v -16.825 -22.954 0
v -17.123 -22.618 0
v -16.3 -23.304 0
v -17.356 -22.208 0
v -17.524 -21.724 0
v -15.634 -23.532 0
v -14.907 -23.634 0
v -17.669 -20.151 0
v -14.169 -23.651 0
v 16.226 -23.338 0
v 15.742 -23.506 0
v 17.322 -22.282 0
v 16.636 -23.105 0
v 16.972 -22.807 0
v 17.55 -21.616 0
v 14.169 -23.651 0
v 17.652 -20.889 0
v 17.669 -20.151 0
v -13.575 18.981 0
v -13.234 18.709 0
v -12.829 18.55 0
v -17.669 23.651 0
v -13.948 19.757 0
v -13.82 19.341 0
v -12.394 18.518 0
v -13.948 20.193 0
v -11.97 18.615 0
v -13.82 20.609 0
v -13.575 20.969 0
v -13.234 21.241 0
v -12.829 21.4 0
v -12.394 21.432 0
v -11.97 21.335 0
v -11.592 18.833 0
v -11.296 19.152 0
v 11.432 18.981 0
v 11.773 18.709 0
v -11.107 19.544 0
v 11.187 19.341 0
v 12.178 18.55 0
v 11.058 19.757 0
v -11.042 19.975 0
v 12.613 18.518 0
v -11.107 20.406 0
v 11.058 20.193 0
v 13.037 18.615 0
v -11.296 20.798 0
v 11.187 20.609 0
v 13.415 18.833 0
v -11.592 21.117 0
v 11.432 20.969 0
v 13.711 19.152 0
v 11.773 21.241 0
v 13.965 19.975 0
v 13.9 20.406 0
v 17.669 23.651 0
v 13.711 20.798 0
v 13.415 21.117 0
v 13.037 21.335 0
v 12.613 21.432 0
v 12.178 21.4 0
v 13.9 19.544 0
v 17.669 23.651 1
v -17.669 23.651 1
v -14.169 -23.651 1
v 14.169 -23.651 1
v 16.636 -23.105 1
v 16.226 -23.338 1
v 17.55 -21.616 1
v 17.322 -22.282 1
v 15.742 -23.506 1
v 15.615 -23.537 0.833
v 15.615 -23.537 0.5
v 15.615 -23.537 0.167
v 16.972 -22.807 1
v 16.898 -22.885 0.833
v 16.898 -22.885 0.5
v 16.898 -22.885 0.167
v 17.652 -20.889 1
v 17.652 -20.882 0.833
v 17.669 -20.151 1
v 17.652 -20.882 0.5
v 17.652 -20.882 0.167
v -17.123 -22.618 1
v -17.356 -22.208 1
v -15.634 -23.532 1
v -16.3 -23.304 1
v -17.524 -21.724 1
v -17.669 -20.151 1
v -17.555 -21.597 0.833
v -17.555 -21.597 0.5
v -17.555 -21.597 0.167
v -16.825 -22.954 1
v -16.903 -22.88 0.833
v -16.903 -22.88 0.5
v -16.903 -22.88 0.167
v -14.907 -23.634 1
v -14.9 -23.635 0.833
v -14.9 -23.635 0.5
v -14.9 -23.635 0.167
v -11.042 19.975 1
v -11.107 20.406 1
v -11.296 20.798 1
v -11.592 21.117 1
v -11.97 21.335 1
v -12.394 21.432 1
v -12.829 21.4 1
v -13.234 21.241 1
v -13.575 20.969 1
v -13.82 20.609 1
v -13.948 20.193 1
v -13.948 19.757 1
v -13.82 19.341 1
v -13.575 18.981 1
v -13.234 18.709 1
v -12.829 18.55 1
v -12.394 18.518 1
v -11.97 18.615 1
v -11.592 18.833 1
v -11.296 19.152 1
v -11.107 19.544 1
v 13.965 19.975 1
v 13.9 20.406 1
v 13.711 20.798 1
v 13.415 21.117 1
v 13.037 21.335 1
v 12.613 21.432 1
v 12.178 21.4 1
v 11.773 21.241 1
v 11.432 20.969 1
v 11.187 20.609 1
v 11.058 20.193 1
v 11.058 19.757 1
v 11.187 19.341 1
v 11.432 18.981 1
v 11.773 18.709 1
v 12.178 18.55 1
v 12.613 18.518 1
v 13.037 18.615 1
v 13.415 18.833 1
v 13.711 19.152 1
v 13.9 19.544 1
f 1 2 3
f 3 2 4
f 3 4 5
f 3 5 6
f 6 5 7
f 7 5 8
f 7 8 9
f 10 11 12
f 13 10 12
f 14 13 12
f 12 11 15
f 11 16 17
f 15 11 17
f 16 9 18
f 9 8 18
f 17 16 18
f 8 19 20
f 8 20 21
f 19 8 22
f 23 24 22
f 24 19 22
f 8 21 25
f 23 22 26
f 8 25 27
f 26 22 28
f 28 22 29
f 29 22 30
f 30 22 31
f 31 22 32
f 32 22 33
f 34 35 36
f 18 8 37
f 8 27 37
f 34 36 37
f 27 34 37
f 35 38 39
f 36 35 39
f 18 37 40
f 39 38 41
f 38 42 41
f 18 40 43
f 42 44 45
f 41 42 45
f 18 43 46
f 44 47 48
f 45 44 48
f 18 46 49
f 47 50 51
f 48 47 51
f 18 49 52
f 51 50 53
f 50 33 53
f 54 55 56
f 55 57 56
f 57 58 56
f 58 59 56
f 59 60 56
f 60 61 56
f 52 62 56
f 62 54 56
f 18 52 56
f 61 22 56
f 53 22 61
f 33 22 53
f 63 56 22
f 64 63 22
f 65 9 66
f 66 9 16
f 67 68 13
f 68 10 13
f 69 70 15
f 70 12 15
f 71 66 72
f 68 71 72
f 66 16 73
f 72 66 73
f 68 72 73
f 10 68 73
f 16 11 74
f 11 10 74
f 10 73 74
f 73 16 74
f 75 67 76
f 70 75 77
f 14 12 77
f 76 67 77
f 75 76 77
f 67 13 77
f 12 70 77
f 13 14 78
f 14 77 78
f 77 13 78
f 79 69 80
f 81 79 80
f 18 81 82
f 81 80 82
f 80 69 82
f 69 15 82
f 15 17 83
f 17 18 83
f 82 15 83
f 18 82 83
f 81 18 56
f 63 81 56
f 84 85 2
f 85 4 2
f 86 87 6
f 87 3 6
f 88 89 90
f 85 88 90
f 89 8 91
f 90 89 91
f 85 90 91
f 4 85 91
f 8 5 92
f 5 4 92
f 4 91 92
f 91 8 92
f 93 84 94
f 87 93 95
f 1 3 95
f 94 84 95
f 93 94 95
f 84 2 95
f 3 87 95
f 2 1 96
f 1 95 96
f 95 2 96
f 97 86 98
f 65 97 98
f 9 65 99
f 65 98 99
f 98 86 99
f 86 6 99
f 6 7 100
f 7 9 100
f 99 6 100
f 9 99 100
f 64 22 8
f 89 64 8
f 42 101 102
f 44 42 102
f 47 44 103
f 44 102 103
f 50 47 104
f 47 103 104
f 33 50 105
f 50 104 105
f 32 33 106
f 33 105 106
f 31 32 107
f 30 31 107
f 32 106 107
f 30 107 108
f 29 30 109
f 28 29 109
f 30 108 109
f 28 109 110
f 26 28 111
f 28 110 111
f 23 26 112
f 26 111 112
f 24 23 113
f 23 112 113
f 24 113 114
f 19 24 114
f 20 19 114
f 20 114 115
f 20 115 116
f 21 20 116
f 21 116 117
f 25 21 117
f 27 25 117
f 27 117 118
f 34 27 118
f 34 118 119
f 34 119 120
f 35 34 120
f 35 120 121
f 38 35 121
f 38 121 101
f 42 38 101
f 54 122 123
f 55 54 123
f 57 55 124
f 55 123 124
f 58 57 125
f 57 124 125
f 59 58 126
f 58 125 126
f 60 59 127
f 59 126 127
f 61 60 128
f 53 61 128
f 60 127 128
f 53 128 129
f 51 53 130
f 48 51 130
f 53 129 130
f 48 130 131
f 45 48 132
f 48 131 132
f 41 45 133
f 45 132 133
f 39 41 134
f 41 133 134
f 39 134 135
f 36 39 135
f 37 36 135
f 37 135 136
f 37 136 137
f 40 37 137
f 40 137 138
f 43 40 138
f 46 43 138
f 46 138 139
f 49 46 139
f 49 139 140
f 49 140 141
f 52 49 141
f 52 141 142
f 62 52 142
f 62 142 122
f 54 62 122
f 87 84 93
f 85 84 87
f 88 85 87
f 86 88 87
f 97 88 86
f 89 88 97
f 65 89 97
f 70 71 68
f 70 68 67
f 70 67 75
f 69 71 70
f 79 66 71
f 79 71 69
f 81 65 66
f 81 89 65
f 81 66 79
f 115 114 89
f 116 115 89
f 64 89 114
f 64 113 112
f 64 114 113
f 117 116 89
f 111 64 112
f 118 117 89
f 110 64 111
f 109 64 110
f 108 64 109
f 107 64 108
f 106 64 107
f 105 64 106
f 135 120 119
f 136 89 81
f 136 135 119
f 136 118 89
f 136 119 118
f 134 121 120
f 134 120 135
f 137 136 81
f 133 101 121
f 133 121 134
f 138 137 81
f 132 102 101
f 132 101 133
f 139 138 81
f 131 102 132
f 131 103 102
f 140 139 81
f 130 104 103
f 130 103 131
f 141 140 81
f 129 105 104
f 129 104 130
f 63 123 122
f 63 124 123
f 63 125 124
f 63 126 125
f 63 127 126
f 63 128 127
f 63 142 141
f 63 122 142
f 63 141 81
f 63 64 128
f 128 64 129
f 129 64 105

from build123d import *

# Parameters (mm, degrees)
EXTRUDE_1_DEPTH     = 1
SKETCH_3_R          = 1.461309726
CUT_EXTRUDE_1_DEPTH = 30.539473805
SKETCH_4_R          = 1.461309726
CUT_EXTRUDE_2_DEPTH = 30.539473805


with BuildPart() as part:
    # 草图1 → 凸台-拉伸1 (new body)
    with BuildSketch(Plane.XY):
        with BuildLine():
            Line((-14.169164627, -23.65123941), (14.169164627, -23.65123941))
            add(Edge.make_bspline(
                [(14.169164627, -23.65123941), (14.641115694, -23.65123941), (14.895621691, -23.634812103), (15.286929381, -23.609554813), (15.614593008, -23.536727458), (16.423695213, -23.356894333), (16.897637323, -22.885072298), (17.371826501, -22.4130043), (17.553529452, -21.601702104), (17.626757355, -21.274740113), (17.652443906, -20.882211126), (17.669164627, -20.626693451), (17.669164627, -20.15123941)],
                knots=[0, 0, 0, 0.125, 0.125, 0.25, 0.25, 0.5, 0.5, 0.75, 0.75, 0.875, 0.875, 1, 1, 1], degree=2))
            Line((17.669164627, -20.15123941), (17.669164627, 23.65123941))
            Line((17.669164627, 23.65123941), (-17.669164627, 23.65123941))
            Line((-17.669164627, 23.65123941), (-17.669164627, -20.15123941))
            add(Edge.make_bspline(
                [(-17.669164627, -20.15123941), (-17.669164627, -20.623190478), (-17.652737319, -20.877696475), (-17.62748003, -21.269004165), (-17.554652675, -21.596667791), (-17.37481955, -22.405769996), (-16.902997515, -22.879712106), (-16.430929517, -23.353901285), (-15.619627321, -23.535604236), (-15.29266533, -23.608832139), (-14.900136342, -23.634518689), (-14.644618668, -23.65123941), (-14.169164627, -23.65123941)],
                knots=[0, 0, 0, 0.125, 0.125, 0.25, 0.25, 0.5, 0.5, 0.75, 0.75, 0.875, 0.875, 1, 1, 1], degree=2))
        make_face()
    extrude(amount=EXTRUDE_1_DEPTH)

    # 草图3 → 切除-拉伸1 (cut, through all)
    with BuildSketch(Plane.XY.offset(1)):
        with Locations((-12.503417236, 19.975)):
            Circle(SKETCH_3_R)
    extrude(amount=-CUT_EXTRUDE_1_DEPTH, mode=Mode.SUBTRACT)

    # 草图4 → 切除-拉伸2 (cut, through all)
    with BuildSketch(Plane.XY.offset(1)):
        with Locations((12.503417236, 19.975)):
            Circle(SKETCH_4_R)
    extrude(amount=-CUT_EXTRUDE_2_DEPTH, mode=Mode.SUBTRACT)


solid = part.part
